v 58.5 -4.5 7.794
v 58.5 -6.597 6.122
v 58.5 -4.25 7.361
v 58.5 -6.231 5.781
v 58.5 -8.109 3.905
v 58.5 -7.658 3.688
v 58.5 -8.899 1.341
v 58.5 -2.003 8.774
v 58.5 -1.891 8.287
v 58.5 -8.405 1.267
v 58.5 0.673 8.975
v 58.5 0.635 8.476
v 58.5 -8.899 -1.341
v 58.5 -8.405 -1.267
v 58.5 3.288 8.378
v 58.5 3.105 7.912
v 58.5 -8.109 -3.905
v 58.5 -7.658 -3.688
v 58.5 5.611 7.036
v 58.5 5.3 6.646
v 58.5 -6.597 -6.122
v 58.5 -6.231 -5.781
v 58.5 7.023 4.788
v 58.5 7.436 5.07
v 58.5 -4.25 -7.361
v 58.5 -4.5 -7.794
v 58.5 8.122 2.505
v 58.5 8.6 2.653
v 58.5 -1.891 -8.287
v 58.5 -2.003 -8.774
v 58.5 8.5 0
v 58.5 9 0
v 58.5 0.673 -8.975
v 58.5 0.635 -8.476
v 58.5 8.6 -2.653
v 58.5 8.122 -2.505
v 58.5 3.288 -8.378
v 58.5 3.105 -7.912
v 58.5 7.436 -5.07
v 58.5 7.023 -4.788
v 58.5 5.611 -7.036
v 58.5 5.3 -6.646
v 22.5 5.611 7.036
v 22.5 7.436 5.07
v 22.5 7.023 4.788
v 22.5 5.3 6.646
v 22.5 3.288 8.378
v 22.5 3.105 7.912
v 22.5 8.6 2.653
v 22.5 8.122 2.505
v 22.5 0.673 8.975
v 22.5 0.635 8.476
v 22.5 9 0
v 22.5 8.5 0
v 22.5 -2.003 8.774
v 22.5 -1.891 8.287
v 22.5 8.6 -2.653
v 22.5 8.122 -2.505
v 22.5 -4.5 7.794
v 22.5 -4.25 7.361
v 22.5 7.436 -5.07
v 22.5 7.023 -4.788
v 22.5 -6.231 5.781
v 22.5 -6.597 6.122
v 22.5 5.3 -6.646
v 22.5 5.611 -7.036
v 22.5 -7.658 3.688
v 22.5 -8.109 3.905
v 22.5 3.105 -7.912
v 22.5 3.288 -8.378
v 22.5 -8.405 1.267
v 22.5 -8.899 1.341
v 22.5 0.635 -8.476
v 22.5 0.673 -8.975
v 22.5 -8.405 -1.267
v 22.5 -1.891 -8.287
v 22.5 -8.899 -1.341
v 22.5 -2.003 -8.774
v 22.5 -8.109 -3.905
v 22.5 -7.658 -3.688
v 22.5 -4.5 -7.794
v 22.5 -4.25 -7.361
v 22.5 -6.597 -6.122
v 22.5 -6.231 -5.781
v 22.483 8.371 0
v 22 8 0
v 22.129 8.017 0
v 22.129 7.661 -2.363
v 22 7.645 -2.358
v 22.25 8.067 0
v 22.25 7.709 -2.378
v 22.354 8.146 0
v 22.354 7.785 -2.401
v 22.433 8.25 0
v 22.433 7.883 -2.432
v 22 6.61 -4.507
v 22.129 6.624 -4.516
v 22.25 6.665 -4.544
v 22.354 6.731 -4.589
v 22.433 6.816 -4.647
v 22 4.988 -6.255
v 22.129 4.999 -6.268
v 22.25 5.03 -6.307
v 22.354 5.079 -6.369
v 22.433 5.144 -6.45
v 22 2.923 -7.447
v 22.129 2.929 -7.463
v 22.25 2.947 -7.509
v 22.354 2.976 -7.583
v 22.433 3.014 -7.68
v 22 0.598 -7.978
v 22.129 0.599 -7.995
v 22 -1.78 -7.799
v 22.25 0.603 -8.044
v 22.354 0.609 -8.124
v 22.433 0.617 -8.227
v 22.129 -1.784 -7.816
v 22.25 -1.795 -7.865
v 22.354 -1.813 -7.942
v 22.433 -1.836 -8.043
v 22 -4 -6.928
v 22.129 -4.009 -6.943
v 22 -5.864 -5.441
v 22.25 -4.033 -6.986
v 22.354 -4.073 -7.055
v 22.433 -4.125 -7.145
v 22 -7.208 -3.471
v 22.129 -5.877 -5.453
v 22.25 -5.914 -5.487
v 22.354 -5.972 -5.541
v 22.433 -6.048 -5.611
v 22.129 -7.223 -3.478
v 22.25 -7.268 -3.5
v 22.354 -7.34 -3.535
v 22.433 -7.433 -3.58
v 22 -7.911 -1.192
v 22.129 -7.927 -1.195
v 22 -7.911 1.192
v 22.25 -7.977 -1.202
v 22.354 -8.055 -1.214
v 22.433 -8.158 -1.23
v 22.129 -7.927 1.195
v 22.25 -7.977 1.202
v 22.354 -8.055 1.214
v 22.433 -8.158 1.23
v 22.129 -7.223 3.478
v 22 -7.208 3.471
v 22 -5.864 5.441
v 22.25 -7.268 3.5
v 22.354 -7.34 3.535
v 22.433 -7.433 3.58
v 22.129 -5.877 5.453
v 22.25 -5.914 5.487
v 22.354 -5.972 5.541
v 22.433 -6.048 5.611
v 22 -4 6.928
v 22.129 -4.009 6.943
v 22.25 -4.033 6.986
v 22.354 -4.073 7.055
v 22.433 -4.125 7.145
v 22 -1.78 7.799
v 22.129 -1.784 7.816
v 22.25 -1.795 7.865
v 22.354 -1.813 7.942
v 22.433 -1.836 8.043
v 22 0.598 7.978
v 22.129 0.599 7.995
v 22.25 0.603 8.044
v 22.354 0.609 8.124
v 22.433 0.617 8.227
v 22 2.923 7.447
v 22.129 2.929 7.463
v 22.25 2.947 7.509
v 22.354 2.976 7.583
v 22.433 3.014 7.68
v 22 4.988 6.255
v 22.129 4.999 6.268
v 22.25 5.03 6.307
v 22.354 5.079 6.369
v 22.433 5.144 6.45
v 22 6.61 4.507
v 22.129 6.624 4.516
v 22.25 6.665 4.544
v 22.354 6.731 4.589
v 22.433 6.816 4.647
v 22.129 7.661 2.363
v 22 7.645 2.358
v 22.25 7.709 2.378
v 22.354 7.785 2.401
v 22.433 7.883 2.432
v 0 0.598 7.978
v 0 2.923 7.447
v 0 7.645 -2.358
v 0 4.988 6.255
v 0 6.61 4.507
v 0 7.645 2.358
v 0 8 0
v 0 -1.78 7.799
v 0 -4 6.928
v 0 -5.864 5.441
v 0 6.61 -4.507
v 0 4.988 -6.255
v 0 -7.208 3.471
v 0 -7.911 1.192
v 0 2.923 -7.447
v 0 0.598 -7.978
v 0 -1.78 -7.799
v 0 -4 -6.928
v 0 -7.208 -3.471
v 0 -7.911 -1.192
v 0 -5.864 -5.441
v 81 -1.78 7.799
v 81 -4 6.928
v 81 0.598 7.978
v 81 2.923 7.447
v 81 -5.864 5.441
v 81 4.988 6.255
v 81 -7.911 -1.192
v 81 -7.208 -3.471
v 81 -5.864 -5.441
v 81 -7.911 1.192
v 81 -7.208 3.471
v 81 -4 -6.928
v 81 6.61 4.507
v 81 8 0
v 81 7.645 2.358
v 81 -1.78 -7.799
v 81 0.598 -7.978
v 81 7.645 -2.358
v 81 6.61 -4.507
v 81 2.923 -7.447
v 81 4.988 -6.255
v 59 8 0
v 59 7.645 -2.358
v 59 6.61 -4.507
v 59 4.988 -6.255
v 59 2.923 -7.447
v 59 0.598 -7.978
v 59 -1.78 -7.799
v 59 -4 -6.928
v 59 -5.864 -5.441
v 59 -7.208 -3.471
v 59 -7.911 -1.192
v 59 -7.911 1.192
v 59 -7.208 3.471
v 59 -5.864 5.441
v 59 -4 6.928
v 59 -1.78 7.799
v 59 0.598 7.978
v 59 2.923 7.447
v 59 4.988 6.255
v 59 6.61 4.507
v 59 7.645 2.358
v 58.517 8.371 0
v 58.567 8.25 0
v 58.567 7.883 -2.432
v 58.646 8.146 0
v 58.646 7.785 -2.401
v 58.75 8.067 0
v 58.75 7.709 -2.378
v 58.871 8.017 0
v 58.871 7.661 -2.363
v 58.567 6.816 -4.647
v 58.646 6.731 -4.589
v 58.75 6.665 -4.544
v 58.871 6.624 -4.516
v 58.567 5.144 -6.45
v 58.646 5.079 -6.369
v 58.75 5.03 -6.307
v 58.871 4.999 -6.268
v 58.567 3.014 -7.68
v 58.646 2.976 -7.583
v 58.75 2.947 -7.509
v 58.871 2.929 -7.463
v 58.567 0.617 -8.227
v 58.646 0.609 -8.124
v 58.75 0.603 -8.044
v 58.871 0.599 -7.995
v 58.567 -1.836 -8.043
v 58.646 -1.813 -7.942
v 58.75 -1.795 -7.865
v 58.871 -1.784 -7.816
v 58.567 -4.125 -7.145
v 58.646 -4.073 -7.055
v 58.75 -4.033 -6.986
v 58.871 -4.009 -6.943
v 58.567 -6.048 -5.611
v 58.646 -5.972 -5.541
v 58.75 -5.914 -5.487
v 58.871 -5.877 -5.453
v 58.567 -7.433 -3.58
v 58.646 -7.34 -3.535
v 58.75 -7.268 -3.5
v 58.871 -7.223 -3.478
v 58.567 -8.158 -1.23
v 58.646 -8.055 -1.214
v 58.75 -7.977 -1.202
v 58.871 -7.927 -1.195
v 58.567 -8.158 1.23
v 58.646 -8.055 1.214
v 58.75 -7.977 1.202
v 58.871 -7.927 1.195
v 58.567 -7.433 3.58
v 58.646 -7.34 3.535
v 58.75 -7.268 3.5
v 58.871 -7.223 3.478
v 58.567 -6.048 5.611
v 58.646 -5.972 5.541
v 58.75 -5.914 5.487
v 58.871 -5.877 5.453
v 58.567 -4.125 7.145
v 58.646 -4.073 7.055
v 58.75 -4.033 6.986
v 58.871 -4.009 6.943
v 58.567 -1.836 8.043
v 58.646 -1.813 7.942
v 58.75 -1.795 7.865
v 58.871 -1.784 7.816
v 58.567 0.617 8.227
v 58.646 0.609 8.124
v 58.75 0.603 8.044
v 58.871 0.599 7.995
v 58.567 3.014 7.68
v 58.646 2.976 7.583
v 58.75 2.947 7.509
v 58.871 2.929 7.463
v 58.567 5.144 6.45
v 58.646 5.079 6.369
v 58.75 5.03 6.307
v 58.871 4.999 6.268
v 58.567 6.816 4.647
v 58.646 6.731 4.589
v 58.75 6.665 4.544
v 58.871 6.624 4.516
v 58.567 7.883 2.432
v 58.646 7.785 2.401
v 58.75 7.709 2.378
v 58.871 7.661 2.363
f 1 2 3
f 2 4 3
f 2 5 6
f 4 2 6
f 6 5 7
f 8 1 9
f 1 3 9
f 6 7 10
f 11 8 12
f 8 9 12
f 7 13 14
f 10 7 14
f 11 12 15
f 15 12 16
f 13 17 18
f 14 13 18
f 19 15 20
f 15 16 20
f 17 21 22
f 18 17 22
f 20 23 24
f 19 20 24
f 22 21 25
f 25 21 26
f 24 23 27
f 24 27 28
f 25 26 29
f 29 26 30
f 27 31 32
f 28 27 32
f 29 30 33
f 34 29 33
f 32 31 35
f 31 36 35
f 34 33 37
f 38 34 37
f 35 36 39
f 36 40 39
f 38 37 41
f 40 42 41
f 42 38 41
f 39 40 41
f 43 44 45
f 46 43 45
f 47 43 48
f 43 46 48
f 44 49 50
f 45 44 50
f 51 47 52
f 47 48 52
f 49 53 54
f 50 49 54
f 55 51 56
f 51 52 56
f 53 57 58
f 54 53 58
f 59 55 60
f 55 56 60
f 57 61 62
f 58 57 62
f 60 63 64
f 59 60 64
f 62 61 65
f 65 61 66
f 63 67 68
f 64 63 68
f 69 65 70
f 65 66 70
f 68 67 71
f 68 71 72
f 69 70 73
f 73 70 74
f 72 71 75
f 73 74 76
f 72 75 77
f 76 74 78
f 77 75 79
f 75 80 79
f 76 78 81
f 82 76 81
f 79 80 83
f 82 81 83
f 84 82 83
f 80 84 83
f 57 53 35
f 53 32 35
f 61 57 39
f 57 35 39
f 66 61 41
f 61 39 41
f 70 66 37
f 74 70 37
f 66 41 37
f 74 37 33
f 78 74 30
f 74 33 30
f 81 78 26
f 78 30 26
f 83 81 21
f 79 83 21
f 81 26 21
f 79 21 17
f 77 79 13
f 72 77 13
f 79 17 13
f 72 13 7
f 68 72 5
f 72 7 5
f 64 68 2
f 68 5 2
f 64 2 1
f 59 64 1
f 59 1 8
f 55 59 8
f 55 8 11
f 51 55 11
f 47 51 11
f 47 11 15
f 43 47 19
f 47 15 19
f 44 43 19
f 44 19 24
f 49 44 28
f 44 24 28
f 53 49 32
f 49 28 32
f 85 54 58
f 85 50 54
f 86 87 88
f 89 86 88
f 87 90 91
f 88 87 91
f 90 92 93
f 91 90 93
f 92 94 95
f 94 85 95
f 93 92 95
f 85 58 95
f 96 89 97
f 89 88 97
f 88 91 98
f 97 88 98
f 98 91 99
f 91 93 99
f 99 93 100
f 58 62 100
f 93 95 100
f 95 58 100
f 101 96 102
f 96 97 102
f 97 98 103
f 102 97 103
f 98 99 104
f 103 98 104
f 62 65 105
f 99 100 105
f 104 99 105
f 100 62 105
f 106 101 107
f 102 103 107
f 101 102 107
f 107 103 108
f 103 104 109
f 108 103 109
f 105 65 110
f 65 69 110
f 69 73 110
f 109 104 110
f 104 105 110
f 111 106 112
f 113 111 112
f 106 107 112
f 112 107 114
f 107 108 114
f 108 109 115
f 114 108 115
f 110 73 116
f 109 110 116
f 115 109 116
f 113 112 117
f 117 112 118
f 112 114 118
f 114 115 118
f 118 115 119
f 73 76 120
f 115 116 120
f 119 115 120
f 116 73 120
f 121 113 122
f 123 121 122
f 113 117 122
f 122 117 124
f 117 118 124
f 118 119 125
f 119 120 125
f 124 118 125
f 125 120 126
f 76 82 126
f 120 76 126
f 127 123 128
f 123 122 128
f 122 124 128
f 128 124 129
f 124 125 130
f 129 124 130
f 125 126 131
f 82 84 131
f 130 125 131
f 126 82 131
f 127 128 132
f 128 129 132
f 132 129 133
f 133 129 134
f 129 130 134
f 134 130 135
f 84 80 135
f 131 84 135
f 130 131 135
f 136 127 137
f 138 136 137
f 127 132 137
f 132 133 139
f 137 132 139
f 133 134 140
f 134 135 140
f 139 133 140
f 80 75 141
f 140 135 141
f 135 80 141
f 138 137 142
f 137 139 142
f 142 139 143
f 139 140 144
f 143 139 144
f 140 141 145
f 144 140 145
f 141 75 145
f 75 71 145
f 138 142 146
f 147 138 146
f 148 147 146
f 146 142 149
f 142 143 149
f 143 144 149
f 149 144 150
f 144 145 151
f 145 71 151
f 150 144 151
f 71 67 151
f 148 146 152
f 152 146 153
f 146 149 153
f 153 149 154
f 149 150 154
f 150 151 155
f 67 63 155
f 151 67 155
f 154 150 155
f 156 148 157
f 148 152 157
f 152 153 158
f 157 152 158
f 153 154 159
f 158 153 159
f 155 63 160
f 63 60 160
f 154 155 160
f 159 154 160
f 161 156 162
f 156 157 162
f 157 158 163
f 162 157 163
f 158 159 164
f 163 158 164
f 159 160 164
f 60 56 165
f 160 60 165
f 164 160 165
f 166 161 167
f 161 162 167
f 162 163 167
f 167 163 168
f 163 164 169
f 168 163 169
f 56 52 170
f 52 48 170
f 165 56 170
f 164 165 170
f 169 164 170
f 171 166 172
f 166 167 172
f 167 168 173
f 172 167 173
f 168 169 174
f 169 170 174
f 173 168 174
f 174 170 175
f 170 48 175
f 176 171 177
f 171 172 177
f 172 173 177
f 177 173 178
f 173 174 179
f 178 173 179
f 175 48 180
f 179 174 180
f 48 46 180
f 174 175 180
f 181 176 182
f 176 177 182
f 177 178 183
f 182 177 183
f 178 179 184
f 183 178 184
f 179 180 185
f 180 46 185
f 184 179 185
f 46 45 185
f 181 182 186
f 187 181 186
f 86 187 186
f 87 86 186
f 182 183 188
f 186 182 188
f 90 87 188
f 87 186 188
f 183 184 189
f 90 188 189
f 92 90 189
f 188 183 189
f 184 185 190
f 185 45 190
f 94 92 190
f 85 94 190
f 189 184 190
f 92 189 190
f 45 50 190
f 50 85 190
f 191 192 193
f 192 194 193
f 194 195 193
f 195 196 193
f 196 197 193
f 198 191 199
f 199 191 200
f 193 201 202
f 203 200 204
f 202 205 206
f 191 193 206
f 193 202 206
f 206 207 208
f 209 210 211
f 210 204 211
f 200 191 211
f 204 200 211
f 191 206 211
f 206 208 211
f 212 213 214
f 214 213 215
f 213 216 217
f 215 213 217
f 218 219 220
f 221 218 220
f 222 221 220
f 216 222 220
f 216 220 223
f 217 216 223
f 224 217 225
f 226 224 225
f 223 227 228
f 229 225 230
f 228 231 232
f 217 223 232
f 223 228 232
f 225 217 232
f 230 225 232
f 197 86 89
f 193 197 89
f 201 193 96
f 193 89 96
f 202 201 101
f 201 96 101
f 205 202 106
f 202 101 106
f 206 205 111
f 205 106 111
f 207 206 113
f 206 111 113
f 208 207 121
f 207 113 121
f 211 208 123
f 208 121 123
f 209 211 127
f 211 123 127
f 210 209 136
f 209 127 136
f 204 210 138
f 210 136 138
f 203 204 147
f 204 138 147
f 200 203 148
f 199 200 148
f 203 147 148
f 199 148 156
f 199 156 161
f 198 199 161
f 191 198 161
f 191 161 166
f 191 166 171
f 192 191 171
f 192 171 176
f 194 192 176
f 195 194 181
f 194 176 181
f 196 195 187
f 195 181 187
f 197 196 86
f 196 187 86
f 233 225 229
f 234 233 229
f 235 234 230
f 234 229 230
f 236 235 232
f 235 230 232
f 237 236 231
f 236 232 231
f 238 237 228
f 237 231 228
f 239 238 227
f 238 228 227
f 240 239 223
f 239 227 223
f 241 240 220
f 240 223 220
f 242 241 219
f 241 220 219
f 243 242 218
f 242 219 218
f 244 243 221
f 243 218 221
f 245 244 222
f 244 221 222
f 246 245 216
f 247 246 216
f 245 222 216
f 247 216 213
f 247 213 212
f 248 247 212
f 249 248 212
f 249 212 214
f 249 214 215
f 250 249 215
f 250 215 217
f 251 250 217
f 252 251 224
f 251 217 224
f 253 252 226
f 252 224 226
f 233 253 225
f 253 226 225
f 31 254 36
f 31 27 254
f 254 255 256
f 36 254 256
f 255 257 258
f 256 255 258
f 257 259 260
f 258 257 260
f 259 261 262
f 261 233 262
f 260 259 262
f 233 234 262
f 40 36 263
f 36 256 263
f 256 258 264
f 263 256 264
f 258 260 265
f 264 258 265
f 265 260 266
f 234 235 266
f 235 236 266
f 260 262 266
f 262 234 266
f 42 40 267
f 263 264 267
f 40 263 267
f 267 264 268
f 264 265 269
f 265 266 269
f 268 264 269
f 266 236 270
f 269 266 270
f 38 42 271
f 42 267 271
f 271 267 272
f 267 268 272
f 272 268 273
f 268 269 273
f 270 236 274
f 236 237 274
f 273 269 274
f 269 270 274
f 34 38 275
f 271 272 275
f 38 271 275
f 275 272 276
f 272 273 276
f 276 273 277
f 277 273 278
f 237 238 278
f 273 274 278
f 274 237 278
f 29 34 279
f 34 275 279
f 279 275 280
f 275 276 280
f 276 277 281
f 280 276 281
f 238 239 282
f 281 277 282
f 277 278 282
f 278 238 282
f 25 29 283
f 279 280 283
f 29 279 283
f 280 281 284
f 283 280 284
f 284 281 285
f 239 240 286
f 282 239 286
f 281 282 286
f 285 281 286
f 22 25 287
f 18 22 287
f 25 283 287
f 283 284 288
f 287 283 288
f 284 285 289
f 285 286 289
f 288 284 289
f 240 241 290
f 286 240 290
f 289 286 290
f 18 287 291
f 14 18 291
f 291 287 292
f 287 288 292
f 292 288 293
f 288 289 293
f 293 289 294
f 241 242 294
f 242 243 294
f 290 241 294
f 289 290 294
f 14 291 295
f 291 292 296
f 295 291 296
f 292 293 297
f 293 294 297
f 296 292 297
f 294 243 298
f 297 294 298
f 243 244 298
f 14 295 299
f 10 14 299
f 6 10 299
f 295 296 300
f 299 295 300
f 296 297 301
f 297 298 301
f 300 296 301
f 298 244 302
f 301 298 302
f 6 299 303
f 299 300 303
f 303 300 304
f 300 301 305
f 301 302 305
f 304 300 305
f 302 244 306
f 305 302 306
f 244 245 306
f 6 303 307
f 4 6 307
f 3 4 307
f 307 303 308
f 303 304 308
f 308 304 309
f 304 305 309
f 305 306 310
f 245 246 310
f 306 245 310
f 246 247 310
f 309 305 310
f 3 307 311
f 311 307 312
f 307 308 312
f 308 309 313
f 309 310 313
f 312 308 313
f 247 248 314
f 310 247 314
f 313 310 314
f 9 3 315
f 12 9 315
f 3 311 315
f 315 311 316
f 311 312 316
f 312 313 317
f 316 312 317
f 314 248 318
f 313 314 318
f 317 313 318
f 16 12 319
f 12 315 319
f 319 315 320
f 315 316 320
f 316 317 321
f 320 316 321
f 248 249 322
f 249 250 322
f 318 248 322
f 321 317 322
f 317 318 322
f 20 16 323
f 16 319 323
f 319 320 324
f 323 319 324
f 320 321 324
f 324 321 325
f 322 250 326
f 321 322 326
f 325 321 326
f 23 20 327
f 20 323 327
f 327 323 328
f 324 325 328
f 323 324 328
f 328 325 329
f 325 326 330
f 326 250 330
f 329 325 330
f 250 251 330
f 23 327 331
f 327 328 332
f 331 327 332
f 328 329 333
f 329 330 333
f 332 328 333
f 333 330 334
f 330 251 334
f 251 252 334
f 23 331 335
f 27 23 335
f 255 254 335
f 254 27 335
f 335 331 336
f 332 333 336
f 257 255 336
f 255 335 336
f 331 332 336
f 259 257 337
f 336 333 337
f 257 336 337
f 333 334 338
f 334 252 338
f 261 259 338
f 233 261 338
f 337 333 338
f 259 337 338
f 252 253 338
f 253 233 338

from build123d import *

# Parameters (mm, degrees)
RADYUS2_R = 0.5


with BuildPart() as part:
    # Çizim1 → Döndür2 (revolve)
    with BuildSketch(Plane.XY):
        Polygon((0, 0), (0, 8), (22.5, 8), (22.5, 9), (58.5, 9), (58.5, 8), (81, 8), (81, 0), align=None)
    revolve(axis=Axis((81, 0, 0), (-1, 0, 0)))

    # Radyus2
    radyus2_edges = [part.edges().sort_by_distance(p)[0] for p in [
        (58.5, -8, 0),
        (22.5, -8, 0),
    ]]
    fillet(radyus2_edges, radius=RADYUS2_R)


solid = part.part
